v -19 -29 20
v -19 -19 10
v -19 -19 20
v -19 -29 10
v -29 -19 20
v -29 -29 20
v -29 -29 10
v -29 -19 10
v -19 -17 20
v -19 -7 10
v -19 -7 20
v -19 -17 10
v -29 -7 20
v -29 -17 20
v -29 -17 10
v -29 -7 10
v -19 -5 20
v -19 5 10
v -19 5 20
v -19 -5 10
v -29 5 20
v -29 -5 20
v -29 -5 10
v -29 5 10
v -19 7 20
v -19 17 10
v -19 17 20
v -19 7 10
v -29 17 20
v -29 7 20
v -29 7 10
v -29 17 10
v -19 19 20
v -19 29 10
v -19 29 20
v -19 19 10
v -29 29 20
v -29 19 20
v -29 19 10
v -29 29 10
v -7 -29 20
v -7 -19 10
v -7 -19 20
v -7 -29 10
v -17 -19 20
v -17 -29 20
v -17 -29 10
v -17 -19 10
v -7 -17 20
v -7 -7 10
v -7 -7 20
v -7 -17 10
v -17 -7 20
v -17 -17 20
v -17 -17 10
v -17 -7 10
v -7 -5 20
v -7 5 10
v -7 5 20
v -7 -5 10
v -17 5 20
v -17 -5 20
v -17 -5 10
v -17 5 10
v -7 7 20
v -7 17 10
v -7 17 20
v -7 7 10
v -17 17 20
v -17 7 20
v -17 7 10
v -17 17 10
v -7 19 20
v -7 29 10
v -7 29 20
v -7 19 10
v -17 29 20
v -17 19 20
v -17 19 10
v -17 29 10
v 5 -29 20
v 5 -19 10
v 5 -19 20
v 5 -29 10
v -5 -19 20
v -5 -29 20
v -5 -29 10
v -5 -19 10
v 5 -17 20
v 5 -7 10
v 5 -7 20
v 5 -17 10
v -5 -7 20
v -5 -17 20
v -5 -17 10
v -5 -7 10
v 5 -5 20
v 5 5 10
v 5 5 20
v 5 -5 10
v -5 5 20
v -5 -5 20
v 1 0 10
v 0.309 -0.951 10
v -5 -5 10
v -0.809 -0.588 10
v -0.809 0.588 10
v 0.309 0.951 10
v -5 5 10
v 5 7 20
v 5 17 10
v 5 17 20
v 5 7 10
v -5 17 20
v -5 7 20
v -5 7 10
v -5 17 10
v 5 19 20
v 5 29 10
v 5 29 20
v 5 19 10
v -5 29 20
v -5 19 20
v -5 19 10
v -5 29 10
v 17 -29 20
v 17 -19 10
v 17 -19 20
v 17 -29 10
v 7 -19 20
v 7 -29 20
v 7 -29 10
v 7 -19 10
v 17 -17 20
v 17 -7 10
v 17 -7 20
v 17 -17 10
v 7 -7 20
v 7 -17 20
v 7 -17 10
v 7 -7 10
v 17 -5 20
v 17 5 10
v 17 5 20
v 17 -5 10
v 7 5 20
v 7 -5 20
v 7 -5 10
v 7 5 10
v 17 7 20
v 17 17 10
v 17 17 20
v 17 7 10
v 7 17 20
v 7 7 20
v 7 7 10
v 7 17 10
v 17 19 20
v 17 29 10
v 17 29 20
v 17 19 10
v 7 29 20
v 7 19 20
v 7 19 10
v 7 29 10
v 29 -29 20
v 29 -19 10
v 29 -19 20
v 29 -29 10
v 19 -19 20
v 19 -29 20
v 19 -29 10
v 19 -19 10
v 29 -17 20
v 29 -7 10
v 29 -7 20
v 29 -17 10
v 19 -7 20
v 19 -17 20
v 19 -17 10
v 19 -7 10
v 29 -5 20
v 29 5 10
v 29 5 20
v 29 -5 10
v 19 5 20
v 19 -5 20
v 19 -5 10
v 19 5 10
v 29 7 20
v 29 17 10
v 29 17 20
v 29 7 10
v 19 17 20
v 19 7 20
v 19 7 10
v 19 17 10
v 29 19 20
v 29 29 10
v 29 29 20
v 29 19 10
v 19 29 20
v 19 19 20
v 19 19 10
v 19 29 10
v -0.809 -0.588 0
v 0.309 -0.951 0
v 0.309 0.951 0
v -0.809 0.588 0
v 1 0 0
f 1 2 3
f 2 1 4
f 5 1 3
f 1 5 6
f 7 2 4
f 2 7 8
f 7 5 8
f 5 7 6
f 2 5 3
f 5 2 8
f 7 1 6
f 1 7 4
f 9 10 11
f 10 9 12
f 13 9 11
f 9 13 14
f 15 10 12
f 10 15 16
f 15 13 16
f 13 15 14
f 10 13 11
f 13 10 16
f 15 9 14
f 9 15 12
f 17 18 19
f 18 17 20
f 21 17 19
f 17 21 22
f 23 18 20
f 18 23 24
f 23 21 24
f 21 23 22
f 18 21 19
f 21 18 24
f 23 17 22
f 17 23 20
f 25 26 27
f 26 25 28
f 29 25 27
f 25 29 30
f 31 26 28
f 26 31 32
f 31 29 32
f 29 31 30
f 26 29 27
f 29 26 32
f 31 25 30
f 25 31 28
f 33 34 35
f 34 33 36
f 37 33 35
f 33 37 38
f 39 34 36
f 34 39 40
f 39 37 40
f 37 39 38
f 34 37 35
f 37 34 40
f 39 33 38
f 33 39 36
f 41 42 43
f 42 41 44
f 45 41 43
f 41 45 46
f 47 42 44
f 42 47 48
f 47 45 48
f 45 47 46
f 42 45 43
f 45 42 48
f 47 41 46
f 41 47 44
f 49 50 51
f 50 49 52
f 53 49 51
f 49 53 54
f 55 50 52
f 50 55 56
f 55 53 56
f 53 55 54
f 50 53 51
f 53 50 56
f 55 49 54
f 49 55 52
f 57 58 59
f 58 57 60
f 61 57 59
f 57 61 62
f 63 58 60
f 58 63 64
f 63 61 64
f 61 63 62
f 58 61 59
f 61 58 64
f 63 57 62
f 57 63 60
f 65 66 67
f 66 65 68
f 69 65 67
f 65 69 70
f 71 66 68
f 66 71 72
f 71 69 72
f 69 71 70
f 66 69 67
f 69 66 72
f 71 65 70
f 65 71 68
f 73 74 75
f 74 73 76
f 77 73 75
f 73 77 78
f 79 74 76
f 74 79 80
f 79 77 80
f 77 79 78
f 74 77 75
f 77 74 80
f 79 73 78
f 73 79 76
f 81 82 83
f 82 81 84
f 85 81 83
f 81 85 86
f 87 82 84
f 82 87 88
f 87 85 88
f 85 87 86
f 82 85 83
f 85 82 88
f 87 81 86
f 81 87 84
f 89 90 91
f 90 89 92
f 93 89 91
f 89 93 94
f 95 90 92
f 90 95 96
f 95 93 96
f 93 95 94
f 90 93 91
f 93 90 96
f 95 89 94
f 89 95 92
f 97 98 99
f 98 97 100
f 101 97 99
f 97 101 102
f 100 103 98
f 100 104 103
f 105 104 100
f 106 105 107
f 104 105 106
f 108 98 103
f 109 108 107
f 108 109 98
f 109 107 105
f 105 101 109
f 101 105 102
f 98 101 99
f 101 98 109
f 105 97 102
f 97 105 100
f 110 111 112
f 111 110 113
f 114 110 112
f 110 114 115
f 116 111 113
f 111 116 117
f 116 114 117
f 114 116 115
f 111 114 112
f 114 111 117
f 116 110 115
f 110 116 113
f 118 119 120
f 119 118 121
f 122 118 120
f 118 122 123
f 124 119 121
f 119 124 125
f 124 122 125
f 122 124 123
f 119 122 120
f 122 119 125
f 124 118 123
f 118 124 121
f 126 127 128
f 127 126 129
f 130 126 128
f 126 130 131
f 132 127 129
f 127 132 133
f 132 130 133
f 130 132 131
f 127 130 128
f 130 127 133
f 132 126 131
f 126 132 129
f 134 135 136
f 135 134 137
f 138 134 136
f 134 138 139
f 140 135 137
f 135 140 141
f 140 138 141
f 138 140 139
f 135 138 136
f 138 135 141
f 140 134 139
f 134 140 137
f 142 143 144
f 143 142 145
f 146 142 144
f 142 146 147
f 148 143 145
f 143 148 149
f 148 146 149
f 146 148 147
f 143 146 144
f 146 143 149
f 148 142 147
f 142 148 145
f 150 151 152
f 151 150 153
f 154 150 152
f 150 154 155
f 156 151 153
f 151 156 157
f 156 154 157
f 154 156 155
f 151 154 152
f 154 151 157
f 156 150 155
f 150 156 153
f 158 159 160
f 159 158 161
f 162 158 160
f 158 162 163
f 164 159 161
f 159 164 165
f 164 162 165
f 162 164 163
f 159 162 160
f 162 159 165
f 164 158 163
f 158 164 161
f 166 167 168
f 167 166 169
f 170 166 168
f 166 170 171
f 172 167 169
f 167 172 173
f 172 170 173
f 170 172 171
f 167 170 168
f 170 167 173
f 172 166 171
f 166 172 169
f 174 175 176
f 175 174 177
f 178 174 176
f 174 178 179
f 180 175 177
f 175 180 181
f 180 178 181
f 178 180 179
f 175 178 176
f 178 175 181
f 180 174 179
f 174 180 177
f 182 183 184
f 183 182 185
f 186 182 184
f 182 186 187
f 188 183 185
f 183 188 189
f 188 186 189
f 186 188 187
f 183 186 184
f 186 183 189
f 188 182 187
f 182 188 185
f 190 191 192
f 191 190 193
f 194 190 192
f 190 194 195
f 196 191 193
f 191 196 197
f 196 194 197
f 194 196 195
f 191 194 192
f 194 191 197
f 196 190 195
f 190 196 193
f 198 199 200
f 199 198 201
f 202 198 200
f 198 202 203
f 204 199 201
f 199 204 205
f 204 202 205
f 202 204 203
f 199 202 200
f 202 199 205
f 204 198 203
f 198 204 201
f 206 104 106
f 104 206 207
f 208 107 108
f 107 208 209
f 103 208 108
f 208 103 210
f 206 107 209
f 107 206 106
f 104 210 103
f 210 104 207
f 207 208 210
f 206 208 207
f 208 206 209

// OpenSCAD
cylinder(r=1, h=10);
for(x = [0:12:48]) {
	for(y = [0:12:48]) {
		translate([x - 29, y - 29, 10]) {
			cube(10);
		}
	}
}
